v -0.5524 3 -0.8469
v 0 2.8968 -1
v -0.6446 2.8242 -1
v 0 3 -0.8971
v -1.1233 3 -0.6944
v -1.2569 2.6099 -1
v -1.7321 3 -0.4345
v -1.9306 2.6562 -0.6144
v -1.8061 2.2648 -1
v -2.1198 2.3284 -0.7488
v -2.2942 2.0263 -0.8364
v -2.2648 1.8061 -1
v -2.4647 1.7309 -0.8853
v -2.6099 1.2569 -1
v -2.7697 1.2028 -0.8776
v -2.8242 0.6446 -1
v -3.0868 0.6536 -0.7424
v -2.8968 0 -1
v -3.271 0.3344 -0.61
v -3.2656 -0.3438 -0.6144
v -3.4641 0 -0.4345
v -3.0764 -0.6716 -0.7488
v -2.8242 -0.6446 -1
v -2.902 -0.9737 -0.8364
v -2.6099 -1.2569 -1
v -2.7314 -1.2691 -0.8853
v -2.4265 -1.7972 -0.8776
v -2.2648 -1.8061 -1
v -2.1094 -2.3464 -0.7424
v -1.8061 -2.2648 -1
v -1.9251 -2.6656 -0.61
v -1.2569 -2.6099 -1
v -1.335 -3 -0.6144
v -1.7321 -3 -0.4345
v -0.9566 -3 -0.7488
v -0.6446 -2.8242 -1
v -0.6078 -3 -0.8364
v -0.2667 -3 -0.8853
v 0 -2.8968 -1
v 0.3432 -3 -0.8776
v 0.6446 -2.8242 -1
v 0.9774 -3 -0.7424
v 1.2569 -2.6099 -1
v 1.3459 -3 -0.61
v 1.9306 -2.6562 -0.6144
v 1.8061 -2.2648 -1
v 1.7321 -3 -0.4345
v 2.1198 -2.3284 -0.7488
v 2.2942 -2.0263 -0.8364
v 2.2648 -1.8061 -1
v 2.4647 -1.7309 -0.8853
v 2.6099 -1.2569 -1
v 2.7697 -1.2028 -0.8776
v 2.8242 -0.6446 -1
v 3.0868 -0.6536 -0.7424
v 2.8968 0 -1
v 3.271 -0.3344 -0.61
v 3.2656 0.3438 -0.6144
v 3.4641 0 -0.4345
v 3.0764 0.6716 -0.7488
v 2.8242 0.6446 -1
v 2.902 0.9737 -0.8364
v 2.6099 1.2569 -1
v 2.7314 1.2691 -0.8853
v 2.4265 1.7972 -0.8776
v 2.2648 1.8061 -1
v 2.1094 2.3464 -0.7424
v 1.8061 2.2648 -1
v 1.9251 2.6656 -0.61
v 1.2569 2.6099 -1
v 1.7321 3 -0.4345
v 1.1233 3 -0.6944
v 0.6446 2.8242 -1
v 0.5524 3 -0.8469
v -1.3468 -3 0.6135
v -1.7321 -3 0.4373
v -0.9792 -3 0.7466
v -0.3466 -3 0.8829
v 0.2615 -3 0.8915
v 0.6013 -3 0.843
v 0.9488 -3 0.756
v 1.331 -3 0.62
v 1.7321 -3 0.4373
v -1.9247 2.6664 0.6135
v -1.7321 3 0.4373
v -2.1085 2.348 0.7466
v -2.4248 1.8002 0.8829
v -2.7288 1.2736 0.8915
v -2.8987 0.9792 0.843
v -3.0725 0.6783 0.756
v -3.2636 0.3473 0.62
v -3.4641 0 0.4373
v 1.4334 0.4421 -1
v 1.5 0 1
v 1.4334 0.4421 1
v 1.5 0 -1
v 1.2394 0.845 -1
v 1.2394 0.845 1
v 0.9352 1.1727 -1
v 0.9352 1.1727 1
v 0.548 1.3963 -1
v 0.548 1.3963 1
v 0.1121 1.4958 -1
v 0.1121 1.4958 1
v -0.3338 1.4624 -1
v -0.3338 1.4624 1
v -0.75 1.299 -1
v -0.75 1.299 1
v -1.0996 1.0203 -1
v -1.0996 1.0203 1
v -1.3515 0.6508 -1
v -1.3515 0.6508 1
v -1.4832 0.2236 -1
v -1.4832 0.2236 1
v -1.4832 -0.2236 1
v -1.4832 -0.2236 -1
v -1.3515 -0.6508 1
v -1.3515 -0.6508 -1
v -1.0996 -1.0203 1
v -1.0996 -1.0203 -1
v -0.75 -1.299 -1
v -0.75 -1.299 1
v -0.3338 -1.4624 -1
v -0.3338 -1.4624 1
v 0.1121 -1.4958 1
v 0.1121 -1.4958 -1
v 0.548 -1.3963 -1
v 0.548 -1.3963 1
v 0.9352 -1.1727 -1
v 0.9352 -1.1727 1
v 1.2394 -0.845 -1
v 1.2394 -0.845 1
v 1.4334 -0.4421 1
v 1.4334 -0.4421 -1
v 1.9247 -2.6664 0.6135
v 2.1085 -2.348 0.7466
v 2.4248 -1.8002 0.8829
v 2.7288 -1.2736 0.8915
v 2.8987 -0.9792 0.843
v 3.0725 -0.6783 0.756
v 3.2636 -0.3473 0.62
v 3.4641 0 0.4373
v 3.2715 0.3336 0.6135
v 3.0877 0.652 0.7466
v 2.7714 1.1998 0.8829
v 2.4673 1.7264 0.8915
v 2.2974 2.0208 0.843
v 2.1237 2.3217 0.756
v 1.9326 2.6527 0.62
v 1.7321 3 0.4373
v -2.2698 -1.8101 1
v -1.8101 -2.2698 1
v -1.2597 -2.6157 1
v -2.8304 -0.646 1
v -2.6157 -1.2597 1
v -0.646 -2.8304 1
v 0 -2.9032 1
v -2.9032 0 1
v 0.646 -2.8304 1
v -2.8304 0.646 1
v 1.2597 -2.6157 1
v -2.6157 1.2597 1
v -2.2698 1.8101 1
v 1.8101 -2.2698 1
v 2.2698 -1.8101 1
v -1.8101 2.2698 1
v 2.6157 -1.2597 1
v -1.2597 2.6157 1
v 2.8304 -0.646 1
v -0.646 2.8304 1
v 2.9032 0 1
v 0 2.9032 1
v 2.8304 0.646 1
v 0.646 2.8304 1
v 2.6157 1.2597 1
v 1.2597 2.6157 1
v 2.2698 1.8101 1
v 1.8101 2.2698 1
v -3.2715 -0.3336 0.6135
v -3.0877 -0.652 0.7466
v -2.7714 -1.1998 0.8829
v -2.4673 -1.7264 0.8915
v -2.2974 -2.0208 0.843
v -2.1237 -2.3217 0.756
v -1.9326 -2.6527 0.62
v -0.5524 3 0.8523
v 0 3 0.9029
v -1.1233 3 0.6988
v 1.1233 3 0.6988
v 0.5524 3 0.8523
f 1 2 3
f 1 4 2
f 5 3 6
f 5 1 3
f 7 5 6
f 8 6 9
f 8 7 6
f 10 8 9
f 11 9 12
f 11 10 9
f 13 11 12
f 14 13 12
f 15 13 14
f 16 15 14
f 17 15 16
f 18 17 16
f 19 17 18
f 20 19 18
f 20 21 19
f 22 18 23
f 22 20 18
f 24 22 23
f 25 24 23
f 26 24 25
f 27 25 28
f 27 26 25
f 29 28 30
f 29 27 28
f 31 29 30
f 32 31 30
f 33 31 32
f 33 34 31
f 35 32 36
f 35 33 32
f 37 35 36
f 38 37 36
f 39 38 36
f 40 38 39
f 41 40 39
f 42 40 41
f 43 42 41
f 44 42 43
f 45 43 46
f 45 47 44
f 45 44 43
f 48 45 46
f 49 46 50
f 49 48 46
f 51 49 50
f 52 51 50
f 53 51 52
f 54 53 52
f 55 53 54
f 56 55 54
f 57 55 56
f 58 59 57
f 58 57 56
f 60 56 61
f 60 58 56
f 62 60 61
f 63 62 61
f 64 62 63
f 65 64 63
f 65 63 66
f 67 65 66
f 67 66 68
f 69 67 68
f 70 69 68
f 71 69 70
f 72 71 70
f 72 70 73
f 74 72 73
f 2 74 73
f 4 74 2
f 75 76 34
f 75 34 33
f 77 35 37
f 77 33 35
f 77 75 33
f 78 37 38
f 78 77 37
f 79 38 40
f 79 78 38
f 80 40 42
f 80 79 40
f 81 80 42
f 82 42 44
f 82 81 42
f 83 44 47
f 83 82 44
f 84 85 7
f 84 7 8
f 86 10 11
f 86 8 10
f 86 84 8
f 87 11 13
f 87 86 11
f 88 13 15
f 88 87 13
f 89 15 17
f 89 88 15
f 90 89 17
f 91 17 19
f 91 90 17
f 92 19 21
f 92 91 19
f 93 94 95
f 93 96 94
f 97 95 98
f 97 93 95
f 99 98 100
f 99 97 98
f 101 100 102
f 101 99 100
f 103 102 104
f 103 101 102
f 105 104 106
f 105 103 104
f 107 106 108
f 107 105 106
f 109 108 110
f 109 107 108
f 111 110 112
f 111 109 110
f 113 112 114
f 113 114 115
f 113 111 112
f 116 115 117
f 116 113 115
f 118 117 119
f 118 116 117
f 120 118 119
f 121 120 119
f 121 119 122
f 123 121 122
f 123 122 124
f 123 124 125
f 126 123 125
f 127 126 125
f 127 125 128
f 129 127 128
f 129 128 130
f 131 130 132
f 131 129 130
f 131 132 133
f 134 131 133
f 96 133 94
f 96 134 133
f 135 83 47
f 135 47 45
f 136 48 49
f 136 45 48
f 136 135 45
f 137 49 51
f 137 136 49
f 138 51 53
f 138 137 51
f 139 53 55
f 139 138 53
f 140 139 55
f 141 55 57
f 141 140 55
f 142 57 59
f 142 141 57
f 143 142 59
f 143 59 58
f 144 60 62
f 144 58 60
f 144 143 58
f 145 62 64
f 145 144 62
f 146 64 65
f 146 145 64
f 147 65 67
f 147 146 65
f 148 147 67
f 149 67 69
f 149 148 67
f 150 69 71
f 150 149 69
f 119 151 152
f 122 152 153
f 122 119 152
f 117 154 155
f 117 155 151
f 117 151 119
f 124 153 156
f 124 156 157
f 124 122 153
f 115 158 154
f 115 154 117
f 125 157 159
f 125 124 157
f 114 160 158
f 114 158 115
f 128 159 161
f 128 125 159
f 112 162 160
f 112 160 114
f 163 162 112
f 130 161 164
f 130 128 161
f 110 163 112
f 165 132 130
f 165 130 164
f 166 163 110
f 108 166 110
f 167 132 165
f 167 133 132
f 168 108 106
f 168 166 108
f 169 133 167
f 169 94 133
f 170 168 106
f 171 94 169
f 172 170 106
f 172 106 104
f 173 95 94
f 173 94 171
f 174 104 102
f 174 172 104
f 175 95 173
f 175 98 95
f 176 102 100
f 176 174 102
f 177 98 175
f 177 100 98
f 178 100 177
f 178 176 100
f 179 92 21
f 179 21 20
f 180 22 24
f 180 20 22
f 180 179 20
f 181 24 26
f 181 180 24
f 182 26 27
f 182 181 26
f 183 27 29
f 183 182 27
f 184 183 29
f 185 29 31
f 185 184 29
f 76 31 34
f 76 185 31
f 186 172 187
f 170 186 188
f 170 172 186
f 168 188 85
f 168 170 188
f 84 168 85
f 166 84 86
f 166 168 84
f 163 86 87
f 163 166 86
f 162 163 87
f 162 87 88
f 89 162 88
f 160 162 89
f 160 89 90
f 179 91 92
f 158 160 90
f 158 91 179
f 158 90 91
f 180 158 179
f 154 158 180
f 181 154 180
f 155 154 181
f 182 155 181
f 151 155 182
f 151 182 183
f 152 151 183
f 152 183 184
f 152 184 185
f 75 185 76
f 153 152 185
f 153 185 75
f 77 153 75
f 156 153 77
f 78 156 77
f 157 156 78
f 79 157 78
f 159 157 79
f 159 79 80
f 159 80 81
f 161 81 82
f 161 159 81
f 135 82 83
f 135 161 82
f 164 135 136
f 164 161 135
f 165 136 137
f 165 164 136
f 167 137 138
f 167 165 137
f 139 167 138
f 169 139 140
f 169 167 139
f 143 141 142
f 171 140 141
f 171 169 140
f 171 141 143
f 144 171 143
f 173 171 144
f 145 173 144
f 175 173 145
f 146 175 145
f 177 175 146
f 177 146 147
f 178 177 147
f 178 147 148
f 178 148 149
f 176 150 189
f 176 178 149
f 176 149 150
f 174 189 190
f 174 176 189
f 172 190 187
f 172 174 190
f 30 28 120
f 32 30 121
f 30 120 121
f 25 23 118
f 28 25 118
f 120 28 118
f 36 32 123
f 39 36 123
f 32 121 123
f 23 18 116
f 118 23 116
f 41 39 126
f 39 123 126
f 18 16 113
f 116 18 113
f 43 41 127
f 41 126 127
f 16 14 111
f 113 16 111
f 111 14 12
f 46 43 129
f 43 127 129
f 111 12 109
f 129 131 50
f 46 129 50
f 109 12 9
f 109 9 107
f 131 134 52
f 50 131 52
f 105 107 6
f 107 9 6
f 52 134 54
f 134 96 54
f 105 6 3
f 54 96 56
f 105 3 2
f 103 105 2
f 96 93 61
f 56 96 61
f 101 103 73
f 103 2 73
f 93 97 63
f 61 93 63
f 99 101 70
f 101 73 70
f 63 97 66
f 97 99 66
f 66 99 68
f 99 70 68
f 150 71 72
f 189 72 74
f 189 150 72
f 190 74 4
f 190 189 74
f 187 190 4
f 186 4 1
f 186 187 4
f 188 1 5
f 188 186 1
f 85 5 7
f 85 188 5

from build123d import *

# Parameters (mm, degrees)
SKETCH_R  = 1.5
PAD_DEPTH = 1


with BuildPart() as part:
    # Sketch → Pad (new body, symmetric)
    with BuildSketch(Plane.XY):
        Polygon((3.464102, 0), (1.732051, 3), (-1.732051, 3), (-3.464102, 0), (-1.732051, -3), (1.732051, -3), align=None)
        Circle(SKETCH_R, mode=Mode.SUBTRACT)
    extrude(amount=PAD_DEPTH, both=True)

    # Sketch001 → Groove (revolve, cut)
    with BuildSketch(Plane.YZ):
        Polygon((2.05363, 1.852295), (2.05363, 2.729858), (5.279402, 2.729858), (5.279402, -3.14441), (2.05363, -3.14441), (2.05363, -1.840465), (3.9, 0), align=None)
    revolve(axis=Axis((0, 0, 0), (0, 0, 1)), mode=Mode.SUBTRACT)


solid = part.part
